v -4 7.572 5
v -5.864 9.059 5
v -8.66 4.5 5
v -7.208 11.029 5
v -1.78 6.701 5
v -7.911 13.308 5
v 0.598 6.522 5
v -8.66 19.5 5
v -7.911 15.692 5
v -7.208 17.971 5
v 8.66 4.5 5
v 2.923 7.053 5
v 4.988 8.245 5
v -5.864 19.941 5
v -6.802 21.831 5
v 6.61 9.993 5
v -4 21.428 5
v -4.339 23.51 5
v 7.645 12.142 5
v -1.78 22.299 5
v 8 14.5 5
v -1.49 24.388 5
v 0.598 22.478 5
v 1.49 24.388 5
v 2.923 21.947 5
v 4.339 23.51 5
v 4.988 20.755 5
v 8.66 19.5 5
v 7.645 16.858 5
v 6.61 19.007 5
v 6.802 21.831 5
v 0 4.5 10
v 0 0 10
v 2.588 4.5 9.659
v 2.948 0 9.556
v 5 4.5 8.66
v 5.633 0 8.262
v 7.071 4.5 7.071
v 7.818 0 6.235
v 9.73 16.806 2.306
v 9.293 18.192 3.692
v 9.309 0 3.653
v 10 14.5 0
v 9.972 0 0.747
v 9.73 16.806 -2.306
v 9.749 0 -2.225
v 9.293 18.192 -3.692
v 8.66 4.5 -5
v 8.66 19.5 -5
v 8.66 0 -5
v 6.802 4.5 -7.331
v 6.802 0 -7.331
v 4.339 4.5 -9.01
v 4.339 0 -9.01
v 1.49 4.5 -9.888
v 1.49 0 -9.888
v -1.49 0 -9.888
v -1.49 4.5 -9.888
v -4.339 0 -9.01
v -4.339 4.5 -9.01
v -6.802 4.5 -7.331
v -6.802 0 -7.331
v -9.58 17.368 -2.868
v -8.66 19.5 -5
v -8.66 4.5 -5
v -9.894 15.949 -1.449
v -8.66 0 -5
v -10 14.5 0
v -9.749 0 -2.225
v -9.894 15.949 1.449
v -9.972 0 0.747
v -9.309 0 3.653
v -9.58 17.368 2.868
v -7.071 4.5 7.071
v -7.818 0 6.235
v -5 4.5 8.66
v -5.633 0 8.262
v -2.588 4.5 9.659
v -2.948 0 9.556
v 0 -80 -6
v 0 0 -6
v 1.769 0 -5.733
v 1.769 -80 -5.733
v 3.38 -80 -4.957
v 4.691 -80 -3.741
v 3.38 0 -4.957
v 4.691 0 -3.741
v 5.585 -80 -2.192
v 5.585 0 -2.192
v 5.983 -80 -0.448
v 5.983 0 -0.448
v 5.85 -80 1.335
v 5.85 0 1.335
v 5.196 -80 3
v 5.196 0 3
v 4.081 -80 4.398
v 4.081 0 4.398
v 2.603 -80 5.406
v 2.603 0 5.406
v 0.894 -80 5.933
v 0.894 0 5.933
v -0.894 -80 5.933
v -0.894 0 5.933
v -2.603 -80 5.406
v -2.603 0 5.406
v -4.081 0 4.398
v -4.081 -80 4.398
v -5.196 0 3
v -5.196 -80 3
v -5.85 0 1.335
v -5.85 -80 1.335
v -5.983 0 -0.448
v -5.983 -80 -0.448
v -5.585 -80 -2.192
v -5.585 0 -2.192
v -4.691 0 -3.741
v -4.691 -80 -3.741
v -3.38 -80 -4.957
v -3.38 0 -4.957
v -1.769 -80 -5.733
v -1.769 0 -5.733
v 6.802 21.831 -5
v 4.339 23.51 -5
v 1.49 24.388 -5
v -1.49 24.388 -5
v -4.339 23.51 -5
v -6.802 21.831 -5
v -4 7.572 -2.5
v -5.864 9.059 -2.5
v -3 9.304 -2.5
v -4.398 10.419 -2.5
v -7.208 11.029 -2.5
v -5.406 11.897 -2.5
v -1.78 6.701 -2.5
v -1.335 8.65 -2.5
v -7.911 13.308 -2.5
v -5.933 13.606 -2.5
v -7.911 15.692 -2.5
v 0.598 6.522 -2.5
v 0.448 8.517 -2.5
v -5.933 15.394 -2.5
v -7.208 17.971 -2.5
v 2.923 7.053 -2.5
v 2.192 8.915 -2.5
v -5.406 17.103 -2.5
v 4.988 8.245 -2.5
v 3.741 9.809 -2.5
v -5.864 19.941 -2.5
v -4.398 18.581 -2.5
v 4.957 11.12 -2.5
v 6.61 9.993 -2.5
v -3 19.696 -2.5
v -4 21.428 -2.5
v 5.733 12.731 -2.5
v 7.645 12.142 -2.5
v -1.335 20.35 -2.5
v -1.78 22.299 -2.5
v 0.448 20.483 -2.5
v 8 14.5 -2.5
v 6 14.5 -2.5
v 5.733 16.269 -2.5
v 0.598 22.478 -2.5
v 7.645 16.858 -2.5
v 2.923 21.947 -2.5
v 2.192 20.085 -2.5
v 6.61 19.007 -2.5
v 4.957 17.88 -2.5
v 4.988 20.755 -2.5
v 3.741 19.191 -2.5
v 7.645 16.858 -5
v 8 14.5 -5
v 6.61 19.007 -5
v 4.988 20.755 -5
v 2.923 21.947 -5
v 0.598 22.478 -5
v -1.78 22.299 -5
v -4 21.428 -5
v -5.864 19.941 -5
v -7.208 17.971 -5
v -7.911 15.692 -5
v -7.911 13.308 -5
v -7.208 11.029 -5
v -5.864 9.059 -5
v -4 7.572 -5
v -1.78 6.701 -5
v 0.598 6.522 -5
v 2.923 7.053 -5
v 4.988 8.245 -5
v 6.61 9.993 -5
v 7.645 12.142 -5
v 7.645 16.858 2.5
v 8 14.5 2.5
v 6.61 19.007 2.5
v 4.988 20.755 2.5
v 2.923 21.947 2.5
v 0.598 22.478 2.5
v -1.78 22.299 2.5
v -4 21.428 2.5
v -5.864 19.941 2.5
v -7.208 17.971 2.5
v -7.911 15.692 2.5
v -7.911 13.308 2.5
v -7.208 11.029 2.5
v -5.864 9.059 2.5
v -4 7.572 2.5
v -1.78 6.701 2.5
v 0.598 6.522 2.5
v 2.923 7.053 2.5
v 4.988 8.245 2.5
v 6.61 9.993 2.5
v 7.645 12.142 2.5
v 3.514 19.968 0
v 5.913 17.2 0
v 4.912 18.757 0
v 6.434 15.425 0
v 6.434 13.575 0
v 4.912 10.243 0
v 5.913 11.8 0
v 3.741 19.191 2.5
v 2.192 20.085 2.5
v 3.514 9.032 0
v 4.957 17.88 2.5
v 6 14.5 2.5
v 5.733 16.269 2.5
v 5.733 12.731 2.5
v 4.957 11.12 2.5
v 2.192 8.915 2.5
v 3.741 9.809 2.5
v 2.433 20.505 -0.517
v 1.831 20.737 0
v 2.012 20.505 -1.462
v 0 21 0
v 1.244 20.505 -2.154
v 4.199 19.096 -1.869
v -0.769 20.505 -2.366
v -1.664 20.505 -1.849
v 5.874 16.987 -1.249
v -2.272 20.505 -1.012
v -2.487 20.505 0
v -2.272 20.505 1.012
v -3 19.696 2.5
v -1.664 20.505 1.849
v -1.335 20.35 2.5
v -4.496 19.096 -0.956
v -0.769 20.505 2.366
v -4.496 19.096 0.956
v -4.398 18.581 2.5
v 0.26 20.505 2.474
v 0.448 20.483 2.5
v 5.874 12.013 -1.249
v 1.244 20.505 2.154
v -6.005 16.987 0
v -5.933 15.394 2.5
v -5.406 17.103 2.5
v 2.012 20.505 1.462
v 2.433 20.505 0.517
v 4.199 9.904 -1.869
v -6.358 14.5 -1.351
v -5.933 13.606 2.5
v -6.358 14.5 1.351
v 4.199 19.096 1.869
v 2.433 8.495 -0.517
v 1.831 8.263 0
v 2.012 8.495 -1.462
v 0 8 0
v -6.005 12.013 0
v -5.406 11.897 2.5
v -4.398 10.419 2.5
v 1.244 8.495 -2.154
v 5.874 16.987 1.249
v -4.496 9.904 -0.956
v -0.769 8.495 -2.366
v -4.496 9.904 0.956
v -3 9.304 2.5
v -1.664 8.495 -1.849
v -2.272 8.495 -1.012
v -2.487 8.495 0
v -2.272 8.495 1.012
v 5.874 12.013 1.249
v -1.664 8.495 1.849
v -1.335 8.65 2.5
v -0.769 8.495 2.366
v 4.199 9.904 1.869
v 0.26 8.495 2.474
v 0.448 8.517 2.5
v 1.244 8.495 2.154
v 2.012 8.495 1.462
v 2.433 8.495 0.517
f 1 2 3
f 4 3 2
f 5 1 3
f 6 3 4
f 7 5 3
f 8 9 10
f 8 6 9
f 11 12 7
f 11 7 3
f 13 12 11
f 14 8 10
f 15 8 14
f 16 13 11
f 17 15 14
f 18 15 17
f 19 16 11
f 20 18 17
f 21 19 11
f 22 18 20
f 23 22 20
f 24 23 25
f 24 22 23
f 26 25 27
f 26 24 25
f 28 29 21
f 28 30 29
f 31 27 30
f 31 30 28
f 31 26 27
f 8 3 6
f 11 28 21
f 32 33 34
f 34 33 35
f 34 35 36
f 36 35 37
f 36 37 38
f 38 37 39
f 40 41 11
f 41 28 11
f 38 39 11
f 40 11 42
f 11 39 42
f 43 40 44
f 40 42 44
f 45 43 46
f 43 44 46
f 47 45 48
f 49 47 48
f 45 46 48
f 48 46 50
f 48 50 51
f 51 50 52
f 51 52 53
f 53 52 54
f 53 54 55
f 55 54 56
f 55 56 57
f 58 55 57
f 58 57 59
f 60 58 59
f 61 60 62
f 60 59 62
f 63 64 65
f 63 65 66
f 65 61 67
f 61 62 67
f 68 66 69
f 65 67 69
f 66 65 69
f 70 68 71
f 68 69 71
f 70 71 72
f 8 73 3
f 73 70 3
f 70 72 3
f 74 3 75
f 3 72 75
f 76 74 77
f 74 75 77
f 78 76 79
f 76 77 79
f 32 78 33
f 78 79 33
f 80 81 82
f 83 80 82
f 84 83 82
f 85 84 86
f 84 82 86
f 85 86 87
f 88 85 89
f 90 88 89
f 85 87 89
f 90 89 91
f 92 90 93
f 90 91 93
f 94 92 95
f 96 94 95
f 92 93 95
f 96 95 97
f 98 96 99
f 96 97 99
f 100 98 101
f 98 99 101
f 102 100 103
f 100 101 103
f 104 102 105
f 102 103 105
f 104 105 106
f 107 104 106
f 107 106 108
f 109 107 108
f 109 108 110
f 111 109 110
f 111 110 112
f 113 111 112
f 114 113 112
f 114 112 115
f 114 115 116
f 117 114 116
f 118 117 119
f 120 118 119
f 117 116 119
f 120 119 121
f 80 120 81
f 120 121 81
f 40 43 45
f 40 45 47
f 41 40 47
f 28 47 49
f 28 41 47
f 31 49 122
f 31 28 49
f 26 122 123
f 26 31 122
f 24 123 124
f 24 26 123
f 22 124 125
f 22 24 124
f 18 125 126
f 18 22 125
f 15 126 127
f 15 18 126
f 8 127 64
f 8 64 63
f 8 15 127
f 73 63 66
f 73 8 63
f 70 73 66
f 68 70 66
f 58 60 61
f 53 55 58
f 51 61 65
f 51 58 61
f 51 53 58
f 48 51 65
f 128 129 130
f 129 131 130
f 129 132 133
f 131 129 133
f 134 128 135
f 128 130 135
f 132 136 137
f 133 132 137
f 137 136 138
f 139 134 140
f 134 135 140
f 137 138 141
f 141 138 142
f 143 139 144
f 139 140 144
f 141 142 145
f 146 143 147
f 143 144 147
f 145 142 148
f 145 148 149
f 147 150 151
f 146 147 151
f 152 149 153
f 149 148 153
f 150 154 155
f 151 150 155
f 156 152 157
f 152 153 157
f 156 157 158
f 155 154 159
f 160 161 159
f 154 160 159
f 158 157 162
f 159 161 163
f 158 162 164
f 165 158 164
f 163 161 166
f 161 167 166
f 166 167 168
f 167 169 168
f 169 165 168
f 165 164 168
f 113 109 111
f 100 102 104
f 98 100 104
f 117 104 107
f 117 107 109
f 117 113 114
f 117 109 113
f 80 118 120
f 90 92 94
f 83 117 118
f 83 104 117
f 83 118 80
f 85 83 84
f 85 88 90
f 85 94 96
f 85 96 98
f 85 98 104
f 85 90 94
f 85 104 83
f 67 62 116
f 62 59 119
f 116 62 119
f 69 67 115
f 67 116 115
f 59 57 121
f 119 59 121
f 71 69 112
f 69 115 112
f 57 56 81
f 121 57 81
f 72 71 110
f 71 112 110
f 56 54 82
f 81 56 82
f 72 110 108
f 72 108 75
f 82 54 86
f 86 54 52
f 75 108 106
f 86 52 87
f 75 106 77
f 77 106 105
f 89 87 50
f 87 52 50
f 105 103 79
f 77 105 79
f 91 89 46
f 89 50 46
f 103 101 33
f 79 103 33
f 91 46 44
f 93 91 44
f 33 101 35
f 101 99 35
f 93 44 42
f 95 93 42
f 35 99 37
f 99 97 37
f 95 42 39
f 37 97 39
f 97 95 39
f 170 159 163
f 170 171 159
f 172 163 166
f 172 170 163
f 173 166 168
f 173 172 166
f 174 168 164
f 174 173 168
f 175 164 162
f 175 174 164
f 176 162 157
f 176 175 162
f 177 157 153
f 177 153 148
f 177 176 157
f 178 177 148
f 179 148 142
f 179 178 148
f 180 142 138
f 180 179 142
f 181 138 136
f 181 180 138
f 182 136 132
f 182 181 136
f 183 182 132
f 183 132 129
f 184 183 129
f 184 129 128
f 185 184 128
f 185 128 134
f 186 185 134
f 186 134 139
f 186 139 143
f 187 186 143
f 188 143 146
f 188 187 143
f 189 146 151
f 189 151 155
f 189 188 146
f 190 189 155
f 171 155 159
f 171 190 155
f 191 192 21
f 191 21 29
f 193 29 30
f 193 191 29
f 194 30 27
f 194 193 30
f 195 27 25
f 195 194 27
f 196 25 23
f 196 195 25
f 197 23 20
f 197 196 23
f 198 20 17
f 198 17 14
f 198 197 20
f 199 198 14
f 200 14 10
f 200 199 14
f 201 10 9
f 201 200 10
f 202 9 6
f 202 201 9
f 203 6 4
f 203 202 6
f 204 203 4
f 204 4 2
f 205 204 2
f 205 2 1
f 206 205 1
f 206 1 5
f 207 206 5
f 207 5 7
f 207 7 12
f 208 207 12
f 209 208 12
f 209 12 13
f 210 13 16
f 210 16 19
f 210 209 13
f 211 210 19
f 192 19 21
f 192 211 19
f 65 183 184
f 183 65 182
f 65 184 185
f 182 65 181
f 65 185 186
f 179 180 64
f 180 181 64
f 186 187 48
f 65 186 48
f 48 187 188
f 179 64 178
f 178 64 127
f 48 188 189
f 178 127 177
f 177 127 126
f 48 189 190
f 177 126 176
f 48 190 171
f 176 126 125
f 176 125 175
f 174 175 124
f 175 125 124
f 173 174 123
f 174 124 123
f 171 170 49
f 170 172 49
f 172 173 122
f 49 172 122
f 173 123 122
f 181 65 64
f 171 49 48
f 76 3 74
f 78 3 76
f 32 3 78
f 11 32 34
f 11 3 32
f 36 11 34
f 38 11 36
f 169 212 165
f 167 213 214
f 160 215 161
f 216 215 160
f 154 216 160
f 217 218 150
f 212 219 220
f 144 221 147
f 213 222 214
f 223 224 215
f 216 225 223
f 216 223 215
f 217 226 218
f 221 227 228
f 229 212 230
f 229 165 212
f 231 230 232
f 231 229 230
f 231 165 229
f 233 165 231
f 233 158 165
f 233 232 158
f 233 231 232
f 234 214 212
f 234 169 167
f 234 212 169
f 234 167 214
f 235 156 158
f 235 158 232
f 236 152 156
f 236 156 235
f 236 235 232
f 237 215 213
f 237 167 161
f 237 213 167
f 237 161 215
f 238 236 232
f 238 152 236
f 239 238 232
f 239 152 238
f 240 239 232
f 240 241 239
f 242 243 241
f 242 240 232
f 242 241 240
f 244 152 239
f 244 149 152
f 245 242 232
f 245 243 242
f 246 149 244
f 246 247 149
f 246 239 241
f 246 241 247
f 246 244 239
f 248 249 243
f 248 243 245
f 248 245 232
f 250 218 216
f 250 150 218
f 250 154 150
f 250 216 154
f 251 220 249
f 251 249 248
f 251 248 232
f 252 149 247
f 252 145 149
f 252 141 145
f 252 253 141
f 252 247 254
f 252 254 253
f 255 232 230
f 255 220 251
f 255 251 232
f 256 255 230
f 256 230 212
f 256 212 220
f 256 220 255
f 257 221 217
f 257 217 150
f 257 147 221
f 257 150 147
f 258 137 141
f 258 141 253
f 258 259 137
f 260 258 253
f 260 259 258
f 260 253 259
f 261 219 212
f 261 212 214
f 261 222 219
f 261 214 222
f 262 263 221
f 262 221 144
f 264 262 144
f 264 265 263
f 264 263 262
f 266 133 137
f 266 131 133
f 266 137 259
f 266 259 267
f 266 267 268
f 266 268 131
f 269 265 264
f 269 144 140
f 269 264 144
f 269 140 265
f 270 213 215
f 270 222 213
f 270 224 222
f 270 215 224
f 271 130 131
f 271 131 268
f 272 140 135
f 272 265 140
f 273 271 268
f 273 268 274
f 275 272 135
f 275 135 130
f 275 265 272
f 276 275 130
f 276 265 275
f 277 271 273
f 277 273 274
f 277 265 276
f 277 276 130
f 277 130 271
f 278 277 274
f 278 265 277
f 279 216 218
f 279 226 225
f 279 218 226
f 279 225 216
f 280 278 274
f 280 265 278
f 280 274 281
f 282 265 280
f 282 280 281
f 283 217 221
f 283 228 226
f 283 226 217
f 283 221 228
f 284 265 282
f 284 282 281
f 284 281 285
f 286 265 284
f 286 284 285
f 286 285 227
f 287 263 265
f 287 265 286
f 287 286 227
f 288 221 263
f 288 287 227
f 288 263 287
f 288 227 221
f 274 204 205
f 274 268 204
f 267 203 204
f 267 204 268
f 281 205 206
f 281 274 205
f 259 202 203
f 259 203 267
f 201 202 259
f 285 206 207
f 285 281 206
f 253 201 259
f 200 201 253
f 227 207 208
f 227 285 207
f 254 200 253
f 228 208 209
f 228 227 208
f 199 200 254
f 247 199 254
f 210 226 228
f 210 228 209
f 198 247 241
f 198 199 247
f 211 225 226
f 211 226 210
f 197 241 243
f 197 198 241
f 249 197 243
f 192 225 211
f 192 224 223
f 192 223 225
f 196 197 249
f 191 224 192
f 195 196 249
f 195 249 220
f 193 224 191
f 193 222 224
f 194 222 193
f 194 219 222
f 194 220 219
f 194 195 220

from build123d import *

# Parameters (mm, degrees)
SKETCH_1_R          = 10
EXTRUDE_1_DEPTH     = 4.5
SKETCH_4_R          = 8
EXTRUDE_3_DEPTH     = 5
SKETCH_5_R          = 8
EXTRUDE_4_DEPTH     = 2.5
SKETCH_8_R          = 4
SKETCH_7_R          = 6
SKETCH_9_R          = 14.627232323
SKETCH_9_R_2        = 10
CUT_EXTRUDE_1_DEPTH = 18
SKETCH_10_R         = 2.5
CUT_EXTRUDE_2_DEPTH = 10
SKETCH_2_R          = 6
EXTRUDE_5_DEPTH     = 80
SKETCH_11_R         = 6
CUT_EXTRUDE_3_DEPTH = 36


with BuildPart() as part:
    # 草图1 → 凸台-拉伸1 (new body)
    with BuildSketch(Plane(origin=(0, 0, 0), x_dir=(1, 0, 0), z_dir=(0, 1, 0))):
        with Locations(Location((0, 0, 0), (0, 0, 270))):
            Circle(SKETCH_1_R)
    extrude(amount=EXTRUDE_1_DEPTH)

    # 草图4 → 凸台-拉伸3 (add, symmetric)
    with BuildSketch(Plane.XY):
        with BuildLine():
            Line((-10, 4.5), (10, 4.5))
            Line((10, 4.5), (10, 14.5))
            ThreePointArc((10, 14.5), (0, 24.5), (-10, 14.5))
            Line((-10, 14.5), (-10, 4.5))
        make_face()
        with Locations((0, 14.5)):
            Circle(SKETCH_4_R, mode=Mode.SUBTRACT)
    extrude(amount=EXTRUDE_3_DEPTH, both=True)

    # 草图5 → 凸台-拉伸4 (add, symmetric)
    with BuildSketch(Plane.XY):
        with Locations((0, 14.5)):
            Circle(SKETCH_5_R)
    extrude(amount=EXTRUDE_4_DEPTH, both=True)

    # 草图8 → 放样1 section 0
    with BuildSketch(Plane.XY.offset(4.5)):
        with Locations((0, 14.5)):
            Circle(SKETCH_8_R)
    # 草图7 → 放样1 section 1
    with BuildSketch(Plane.XY.offset(2.5)):
        with Locations((0, 14.5)):
            Circle(SKETCH_7_R)
    loft_1 = loft()

    # 镜向1: 放样1 across plane
    add(loft_1.mirror(Plane.XY))

    # 草图9 → 切除-拉伸1 (cut)
    with BuildSketch(Plane(origin=(0, 4.5, 0), x_dir=(1, 0, 0), z_dir=(0, 1, 0))):
        Circle(SKETCH_9_R)
        with Locations(Location((0, 0, 0), (0, 0, 150))):
            Circle(SKETCH_9_R_2, mode=Mode.SUBTRACT)
    extrude(amount=CUT_EXTRUDE_1_DEPTH, mode=Mode.SUBTRACT)

    # 草图10 → 切除-拉伸2 (cut)
    with BuildSketch(Plane.XY.offset(4.5)):
        with Locations((0, 14.5)):
            Circle(SKETCH_10_R)
    extrude(amount=-CUT_EXTRUDE_2_DEPTH, mode=Mode.SUBTRACT)

    # 草图2 → 凸台-拉伸5 (add)
    with BuildSketch(Plane.XZ):
        with Locations(Location((0, 0, 0), (0, 0, 270))):
            Circle(SKETCH_2_R)
    extrude(amount=EXTRUDE_5_DEPTH)

    # 草图11 → 切除-拉伸3 (cut)
    with BuildSketch(Plane.XY.offset(4.5)):
        with Locations((0, 14.5)):
            Circle(SKETCH_11_R)
    extrude(amount=-CUT_EXTRUDE_3_DEPTH, mode=Mode.SUBTRACT)

    # 草图12 → 切除-旋转1 (revolve, cut)
    with BuildSketch(Plane.XY):
        with BuildLine():
            Line((0, 8), (0, 21))
            ThreePointArc((0, 21), (6.5, 14.5), (0, 8))
        make_face()
    revolve(axis=Axis((0, 8, 0), (0, 1, 0)), mode=Mode.SUBTRACT)


solid = part.part
